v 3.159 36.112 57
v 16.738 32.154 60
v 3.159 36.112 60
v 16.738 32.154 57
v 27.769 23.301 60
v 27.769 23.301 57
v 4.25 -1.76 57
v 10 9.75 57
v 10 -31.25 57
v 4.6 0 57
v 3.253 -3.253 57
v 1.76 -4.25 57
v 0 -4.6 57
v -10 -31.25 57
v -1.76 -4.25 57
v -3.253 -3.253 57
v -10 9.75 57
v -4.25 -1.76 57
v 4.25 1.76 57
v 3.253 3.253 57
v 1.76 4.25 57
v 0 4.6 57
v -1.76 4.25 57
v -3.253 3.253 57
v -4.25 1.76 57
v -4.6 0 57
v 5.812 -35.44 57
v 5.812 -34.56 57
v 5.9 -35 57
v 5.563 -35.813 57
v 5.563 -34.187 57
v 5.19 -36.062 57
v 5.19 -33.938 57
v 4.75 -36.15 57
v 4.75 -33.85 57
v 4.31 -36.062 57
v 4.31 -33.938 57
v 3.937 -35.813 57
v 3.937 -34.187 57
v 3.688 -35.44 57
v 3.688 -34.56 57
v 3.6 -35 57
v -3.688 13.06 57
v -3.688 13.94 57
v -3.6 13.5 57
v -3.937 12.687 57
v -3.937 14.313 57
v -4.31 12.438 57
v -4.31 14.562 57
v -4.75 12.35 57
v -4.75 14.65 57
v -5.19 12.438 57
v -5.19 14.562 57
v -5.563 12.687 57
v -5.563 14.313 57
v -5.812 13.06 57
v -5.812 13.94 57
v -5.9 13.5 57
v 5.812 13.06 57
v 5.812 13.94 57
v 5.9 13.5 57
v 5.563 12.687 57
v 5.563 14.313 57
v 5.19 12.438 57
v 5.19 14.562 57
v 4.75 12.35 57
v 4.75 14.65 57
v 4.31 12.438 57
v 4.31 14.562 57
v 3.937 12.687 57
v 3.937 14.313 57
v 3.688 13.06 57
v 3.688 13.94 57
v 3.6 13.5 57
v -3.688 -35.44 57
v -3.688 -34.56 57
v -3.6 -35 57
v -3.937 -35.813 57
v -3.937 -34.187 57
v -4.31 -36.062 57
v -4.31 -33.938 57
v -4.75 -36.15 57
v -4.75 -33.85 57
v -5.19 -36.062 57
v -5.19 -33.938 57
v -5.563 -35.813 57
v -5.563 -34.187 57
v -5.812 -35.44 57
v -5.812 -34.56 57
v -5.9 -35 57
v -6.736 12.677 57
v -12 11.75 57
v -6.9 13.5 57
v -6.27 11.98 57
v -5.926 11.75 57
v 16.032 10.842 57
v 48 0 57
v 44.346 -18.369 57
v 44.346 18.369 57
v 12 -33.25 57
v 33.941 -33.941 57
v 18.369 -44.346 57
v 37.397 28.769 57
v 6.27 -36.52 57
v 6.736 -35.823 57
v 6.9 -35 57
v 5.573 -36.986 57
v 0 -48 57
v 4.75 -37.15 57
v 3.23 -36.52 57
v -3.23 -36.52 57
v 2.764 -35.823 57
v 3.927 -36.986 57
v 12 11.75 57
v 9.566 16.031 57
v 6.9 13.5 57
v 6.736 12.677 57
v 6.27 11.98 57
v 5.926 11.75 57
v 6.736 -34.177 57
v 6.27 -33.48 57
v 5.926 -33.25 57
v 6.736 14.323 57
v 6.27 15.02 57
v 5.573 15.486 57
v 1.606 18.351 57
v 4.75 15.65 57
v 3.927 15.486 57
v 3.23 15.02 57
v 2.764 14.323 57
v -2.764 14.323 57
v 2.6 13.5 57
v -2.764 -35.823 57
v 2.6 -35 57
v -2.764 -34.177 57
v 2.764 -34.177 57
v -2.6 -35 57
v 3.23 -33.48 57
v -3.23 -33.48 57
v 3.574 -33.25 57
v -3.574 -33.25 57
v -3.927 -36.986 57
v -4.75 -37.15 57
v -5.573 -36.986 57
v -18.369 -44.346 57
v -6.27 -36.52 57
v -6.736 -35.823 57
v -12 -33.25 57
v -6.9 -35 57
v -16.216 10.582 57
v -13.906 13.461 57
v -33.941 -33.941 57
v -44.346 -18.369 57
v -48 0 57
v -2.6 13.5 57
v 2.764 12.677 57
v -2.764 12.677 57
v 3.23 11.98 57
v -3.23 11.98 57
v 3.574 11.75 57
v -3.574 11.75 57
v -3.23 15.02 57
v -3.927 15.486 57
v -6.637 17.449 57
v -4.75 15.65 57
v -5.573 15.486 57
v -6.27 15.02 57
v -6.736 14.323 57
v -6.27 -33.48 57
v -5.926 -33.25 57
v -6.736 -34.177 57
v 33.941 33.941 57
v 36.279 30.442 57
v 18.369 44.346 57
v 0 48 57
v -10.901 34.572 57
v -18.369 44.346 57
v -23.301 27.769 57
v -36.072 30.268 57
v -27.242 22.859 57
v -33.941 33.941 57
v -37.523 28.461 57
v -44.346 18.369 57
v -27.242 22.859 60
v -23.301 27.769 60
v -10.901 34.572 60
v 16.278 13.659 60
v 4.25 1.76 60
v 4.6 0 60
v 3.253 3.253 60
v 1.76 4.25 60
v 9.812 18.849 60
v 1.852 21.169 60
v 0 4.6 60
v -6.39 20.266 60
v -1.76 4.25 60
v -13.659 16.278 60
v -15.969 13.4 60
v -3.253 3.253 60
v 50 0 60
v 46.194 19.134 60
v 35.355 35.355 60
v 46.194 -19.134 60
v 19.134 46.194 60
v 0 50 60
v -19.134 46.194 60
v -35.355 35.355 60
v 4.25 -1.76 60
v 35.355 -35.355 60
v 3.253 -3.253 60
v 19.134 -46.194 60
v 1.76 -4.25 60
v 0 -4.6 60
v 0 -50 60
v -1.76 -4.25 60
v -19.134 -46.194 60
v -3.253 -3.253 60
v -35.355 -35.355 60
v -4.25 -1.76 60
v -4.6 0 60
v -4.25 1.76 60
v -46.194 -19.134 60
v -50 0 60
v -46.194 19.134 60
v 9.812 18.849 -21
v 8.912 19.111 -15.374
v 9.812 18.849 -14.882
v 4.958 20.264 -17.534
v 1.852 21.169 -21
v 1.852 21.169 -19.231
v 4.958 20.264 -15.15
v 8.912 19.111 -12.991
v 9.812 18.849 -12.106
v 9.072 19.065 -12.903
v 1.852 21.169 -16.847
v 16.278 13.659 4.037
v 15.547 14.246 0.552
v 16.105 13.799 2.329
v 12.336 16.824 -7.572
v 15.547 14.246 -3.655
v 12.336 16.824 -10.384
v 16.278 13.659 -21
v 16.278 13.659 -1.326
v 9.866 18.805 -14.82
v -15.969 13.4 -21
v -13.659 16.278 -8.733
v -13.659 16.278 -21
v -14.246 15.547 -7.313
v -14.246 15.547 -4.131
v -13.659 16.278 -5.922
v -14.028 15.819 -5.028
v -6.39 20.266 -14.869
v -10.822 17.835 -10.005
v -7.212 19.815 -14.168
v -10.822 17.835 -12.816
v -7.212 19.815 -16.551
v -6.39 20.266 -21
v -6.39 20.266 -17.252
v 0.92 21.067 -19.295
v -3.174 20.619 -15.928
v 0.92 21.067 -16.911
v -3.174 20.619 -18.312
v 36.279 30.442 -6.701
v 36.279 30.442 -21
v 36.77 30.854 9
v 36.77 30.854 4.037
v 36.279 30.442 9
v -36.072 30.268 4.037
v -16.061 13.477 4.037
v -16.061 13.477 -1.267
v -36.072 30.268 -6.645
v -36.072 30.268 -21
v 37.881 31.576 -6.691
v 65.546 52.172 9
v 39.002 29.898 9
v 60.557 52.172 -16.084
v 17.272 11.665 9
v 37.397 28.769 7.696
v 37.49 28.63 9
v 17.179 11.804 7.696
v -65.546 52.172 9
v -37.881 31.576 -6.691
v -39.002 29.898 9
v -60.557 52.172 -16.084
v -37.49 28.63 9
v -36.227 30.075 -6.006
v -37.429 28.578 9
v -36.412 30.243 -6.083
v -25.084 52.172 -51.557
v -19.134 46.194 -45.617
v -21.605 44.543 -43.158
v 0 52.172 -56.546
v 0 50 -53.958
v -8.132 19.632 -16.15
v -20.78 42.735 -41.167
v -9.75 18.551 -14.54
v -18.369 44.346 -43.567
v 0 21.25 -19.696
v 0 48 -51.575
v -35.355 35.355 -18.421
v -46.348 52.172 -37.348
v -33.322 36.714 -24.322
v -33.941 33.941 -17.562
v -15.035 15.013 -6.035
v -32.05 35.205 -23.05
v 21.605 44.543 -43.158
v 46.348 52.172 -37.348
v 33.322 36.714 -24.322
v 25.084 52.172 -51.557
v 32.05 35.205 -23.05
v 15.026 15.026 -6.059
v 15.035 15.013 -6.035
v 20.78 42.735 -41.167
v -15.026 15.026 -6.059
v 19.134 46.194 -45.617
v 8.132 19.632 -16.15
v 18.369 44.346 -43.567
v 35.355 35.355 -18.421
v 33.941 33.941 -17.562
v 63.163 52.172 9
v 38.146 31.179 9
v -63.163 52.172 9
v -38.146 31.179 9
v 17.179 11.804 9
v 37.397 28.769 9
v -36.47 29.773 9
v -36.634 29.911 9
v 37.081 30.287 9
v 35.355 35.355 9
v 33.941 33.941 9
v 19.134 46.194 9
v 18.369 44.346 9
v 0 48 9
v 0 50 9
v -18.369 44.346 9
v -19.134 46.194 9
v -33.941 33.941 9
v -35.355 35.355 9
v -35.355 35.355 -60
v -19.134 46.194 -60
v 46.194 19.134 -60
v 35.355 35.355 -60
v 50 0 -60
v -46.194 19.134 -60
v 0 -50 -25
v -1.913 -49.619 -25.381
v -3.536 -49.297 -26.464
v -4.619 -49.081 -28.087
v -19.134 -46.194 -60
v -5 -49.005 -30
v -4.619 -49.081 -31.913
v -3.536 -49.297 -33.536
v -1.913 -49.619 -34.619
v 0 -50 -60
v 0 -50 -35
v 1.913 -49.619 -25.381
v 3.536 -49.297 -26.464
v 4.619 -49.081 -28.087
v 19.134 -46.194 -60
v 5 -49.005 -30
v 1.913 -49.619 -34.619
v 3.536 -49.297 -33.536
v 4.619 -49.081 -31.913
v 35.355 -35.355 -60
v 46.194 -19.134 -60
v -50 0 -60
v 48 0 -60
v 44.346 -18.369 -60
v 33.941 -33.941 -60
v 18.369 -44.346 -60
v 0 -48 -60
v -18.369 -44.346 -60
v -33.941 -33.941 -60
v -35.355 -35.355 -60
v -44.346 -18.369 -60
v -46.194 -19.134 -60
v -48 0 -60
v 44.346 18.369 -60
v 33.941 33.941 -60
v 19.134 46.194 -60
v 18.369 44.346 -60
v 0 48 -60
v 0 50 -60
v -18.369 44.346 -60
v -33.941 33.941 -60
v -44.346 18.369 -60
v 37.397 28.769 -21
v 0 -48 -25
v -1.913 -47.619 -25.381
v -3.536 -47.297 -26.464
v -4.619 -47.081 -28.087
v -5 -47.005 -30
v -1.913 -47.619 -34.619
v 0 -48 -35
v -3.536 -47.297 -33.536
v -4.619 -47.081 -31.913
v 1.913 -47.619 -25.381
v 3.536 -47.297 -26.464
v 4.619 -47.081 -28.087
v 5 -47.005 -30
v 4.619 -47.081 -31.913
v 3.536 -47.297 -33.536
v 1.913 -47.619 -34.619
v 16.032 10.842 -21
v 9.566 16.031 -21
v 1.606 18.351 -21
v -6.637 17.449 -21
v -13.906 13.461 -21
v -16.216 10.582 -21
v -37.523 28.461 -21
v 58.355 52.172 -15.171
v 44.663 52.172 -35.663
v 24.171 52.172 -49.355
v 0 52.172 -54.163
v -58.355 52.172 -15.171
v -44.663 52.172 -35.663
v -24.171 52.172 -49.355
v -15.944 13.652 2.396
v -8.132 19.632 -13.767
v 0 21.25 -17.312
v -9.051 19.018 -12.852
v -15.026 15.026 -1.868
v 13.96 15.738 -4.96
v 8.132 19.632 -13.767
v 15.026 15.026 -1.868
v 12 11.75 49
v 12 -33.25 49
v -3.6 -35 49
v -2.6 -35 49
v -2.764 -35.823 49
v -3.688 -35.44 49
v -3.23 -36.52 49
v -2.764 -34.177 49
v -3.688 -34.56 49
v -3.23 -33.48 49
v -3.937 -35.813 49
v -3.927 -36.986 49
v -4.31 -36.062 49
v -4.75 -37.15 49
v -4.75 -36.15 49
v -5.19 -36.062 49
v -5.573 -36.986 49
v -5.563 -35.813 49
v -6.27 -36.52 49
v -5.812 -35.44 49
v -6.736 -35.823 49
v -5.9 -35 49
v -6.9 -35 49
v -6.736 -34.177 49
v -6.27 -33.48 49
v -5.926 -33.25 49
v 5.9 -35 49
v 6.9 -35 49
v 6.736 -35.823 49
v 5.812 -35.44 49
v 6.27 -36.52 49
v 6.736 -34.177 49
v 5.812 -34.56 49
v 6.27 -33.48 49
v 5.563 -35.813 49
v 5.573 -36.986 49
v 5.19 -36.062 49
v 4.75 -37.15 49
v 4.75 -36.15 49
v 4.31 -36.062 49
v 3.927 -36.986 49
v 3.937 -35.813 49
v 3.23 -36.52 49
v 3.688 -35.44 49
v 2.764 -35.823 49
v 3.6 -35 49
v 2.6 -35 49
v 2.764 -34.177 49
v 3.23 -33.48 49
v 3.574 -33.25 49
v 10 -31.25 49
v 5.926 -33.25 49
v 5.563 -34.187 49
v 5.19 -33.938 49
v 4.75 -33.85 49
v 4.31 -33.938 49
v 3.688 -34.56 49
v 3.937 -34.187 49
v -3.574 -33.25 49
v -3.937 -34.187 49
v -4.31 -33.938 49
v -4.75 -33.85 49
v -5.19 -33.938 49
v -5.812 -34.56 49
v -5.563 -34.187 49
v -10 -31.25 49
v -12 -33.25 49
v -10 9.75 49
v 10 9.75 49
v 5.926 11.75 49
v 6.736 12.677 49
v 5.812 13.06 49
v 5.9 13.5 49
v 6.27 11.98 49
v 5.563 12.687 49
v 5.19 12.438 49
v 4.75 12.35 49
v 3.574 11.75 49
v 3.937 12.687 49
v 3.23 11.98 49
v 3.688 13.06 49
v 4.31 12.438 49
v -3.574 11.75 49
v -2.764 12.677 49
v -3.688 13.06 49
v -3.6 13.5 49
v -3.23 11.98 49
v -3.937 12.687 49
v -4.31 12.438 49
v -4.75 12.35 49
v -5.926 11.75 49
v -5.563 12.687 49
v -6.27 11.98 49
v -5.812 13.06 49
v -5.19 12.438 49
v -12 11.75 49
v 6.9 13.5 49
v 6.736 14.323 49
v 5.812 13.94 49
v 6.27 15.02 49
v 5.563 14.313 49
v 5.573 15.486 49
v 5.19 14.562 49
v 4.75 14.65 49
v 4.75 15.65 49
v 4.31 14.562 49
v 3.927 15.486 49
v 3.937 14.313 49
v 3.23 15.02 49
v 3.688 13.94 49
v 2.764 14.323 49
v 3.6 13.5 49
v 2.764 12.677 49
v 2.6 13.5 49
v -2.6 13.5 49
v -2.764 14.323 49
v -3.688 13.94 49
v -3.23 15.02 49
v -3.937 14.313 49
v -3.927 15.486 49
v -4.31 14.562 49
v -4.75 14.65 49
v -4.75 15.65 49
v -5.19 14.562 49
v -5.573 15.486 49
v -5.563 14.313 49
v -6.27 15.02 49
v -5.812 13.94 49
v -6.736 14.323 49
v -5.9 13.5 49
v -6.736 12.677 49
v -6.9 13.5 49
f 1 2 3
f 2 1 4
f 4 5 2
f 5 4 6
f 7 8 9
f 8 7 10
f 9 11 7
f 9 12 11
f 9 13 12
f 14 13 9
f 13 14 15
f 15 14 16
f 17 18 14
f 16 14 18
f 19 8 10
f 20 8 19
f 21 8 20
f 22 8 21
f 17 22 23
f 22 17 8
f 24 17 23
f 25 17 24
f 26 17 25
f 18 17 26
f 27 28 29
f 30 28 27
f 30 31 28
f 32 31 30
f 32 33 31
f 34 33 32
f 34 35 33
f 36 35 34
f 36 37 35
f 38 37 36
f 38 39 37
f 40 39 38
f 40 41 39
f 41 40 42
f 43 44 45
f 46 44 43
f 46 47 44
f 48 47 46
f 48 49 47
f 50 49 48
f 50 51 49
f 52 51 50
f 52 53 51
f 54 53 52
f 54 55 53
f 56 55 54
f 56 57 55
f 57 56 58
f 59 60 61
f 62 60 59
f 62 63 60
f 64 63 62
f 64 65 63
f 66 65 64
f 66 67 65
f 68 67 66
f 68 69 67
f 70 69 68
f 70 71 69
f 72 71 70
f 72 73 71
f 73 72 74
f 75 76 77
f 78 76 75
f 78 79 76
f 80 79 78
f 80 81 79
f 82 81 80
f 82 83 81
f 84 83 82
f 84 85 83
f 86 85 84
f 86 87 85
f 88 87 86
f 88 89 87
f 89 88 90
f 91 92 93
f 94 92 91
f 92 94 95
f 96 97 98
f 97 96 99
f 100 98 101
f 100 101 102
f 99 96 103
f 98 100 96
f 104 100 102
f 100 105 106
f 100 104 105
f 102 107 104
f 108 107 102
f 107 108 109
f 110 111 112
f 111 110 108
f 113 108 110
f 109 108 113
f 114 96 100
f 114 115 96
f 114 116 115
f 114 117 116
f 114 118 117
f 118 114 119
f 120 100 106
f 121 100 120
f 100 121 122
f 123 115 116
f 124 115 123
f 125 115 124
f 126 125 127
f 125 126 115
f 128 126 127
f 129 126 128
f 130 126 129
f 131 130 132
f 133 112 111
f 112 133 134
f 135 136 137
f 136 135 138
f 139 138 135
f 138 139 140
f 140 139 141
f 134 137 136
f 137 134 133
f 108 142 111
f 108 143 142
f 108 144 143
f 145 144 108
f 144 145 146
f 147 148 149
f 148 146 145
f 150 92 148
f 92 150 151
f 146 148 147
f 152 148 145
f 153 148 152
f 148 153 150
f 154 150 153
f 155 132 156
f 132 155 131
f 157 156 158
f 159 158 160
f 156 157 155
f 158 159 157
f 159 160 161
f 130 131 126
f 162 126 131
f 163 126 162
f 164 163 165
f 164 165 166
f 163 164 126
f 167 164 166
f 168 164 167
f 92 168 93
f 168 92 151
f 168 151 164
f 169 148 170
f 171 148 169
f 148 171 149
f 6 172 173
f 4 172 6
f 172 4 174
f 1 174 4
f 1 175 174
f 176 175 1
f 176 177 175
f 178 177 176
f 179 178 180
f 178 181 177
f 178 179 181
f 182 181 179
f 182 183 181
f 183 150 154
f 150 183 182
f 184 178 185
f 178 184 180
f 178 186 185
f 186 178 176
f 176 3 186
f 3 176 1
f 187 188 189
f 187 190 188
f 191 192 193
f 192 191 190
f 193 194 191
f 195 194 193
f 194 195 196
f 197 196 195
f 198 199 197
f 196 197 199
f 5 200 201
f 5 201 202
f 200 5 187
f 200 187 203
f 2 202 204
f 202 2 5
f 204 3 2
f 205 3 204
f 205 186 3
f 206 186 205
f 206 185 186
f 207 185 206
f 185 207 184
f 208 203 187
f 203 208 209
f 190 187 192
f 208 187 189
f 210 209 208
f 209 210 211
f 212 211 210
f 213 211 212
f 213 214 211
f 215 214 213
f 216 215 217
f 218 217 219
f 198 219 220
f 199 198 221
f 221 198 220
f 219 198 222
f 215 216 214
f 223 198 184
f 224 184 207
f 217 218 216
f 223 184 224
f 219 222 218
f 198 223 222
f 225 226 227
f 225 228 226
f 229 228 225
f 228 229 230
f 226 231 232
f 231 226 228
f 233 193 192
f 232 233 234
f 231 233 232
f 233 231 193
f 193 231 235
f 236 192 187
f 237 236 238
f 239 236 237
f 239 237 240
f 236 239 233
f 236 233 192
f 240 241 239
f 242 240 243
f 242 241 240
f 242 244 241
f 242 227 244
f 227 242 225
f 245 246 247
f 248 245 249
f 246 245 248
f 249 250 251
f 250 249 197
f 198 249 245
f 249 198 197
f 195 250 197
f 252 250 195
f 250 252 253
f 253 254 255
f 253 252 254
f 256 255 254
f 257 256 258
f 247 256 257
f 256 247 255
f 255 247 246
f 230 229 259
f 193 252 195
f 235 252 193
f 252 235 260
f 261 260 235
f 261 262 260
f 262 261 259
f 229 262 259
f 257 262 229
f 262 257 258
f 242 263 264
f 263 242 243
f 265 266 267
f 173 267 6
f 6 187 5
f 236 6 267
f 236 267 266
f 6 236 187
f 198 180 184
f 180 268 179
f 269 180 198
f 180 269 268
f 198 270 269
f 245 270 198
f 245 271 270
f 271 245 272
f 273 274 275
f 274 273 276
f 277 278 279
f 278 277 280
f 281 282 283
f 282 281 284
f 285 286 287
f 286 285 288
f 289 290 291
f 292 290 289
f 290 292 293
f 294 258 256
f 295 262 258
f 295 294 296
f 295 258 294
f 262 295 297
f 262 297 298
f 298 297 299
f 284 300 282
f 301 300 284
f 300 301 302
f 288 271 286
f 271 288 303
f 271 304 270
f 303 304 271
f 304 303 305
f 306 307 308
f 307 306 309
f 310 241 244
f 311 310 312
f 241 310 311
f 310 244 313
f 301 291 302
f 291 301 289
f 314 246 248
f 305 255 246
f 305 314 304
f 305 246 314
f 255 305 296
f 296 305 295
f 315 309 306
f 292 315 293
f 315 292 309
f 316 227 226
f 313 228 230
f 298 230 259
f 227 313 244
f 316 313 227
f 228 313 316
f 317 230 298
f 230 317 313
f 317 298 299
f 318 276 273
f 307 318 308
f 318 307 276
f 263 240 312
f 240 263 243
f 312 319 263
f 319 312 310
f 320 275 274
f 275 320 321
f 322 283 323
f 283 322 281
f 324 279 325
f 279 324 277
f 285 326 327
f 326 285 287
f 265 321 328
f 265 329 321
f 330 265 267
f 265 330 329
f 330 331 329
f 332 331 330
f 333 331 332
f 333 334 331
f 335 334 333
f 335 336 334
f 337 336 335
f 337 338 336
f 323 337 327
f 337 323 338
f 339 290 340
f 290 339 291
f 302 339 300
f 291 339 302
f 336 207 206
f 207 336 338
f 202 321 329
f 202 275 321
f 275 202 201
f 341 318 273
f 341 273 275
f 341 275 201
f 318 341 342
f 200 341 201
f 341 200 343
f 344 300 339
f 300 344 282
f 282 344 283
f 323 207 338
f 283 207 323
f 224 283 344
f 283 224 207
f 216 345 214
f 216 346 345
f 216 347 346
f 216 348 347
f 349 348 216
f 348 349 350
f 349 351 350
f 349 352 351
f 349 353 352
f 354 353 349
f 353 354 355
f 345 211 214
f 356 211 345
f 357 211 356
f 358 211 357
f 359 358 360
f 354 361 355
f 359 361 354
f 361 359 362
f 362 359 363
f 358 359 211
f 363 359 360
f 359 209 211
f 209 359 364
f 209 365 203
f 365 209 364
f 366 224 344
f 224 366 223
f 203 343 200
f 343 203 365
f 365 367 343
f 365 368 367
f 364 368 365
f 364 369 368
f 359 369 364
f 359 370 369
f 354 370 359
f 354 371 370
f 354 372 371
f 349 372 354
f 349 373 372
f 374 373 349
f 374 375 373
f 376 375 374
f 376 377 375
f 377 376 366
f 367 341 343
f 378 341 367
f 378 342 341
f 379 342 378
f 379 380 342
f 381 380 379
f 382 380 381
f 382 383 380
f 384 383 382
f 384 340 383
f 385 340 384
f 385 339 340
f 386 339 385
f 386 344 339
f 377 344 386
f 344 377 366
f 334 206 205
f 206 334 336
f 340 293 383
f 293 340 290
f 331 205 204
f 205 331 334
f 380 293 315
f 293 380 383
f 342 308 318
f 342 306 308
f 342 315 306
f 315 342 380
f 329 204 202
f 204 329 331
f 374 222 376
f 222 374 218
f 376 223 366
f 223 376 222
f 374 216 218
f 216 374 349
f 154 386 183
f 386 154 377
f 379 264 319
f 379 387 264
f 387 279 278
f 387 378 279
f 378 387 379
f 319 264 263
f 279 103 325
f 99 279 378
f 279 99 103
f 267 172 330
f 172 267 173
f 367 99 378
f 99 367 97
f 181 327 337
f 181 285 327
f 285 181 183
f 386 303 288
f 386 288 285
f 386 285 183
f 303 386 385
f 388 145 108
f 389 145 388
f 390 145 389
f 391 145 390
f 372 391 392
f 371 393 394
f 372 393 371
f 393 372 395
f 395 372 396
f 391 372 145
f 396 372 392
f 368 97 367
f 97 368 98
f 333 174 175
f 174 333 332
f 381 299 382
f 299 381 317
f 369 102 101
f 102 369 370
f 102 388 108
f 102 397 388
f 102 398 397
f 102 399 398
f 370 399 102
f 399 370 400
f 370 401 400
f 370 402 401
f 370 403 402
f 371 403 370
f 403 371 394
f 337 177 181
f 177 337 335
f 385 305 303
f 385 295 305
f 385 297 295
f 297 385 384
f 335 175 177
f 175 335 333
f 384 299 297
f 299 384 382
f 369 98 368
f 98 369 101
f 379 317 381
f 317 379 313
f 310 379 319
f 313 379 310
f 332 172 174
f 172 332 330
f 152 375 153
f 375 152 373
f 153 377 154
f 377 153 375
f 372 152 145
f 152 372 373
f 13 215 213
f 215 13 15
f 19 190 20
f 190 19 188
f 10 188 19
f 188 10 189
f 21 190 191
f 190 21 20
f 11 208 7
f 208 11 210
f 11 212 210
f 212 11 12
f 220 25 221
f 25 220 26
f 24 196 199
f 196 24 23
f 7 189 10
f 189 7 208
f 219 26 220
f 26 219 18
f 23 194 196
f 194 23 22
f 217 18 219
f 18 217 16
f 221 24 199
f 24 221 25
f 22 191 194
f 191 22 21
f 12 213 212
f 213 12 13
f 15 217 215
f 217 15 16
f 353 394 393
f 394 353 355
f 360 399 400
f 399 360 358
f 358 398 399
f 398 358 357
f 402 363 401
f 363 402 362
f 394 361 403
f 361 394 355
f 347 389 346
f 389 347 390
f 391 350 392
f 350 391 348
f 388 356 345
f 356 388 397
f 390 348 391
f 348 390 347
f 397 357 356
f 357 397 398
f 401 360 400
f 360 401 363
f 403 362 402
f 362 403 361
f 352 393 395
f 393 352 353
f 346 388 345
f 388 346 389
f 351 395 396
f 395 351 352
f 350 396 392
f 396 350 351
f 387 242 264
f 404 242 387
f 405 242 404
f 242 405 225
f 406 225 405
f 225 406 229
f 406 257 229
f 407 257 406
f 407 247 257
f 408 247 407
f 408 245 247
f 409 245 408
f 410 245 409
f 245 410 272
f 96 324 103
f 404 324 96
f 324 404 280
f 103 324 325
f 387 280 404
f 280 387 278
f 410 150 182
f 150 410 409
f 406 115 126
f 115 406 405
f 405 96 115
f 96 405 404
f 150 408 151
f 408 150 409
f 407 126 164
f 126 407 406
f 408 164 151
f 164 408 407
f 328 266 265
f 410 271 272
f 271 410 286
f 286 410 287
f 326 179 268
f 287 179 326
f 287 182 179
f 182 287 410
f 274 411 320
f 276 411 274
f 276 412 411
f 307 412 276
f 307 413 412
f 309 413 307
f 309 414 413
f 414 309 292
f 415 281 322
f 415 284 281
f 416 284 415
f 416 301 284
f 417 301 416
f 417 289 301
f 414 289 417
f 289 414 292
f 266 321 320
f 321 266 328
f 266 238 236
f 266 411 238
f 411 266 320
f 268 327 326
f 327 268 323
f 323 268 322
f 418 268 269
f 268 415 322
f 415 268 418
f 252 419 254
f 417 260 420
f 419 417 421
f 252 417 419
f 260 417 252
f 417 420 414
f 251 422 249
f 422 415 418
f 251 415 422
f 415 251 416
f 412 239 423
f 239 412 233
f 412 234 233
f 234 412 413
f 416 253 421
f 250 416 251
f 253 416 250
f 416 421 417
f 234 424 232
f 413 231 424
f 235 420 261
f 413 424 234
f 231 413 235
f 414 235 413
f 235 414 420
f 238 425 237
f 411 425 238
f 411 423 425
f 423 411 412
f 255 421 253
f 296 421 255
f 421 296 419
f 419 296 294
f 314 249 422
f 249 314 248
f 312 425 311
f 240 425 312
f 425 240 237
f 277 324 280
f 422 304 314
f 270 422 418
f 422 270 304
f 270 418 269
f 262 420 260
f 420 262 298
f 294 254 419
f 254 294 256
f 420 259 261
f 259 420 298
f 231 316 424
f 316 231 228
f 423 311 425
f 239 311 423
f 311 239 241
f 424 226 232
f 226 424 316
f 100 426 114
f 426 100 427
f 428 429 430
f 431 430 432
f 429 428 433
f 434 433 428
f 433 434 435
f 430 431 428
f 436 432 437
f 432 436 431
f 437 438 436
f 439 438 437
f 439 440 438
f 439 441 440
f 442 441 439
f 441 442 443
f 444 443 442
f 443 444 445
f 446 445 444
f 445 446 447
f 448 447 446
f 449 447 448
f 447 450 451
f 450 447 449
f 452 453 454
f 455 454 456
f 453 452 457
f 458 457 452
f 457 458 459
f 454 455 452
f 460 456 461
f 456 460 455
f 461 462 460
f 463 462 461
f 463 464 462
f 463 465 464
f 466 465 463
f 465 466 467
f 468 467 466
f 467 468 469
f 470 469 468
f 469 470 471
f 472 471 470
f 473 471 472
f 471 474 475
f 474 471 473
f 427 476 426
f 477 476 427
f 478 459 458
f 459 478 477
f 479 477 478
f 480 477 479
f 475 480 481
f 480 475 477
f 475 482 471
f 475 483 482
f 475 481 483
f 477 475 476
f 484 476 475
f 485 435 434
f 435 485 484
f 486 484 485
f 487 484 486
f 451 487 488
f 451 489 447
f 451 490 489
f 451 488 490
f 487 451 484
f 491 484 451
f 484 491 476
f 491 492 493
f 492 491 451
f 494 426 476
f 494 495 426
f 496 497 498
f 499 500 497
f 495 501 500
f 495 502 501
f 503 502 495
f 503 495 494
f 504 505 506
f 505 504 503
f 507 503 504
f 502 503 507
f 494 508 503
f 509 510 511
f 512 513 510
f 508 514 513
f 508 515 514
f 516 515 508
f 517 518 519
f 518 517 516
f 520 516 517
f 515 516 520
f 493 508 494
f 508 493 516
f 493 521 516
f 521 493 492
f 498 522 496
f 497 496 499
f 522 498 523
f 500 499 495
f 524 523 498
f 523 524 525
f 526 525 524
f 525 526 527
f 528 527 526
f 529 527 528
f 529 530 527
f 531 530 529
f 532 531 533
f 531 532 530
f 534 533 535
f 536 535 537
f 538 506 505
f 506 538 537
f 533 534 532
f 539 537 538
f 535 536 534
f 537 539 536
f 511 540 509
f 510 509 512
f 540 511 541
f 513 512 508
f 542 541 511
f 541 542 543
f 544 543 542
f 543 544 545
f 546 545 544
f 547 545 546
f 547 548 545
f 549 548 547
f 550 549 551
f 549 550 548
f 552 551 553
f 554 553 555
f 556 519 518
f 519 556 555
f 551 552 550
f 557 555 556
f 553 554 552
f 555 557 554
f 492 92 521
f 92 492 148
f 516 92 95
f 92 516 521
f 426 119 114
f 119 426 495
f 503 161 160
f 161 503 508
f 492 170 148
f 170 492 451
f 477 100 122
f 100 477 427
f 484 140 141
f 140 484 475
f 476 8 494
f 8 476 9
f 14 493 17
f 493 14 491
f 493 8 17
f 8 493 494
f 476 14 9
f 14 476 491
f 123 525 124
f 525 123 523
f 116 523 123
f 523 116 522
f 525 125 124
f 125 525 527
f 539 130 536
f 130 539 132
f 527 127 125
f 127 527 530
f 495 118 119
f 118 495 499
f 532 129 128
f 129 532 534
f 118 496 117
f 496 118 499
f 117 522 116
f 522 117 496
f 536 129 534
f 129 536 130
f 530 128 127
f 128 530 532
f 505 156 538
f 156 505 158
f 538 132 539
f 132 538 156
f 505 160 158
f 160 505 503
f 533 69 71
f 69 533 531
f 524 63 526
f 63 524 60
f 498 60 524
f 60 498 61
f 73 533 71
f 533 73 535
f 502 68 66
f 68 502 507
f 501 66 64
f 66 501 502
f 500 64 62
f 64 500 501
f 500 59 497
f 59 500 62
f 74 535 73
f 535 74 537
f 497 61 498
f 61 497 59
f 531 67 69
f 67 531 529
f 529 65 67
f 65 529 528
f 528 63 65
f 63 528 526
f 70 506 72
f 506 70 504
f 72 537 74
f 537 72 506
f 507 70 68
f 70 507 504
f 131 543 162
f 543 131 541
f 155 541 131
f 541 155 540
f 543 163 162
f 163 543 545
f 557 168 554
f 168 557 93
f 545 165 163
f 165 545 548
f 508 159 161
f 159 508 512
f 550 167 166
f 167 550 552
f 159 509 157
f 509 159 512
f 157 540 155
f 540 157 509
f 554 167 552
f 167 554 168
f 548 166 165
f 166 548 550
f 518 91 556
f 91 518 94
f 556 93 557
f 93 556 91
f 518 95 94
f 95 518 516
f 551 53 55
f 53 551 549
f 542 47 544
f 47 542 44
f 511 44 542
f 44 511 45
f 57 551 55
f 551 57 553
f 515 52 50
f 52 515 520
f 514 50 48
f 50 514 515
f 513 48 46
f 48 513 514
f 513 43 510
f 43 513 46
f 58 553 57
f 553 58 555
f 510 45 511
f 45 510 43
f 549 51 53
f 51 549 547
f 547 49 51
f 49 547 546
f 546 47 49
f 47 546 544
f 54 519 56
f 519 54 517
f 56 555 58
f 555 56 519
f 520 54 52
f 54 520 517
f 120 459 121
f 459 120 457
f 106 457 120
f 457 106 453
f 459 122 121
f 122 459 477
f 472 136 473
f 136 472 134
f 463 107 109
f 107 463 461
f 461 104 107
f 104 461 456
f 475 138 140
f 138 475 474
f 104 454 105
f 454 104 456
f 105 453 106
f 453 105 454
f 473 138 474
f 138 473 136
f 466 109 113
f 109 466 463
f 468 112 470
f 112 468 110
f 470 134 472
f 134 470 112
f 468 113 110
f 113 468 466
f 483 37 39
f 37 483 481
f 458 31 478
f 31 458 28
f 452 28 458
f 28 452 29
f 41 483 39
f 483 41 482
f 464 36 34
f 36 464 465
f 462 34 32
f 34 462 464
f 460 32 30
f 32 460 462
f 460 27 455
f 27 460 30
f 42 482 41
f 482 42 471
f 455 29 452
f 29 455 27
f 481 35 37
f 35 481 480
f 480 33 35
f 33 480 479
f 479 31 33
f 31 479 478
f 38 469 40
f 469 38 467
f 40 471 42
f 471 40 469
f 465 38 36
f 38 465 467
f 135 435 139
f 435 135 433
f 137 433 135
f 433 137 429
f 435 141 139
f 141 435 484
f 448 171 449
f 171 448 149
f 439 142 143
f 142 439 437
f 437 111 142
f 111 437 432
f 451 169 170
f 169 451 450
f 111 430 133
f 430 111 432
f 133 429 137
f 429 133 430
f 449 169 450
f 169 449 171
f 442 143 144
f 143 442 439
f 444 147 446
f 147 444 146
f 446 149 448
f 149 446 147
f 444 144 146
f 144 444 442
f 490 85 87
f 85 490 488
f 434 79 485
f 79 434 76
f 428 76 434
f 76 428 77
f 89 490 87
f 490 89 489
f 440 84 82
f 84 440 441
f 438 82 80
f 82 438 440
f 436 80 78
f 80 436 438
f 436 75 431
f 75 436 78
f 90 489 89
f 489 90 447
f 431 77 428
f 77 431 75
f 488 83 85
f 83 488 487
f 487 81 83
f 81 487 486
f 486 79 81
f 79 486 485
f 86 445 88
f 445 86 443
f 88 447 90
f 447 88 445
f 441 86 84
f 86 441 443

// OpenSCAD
difference(){
  cylinder($fn=16, d = 100, h = 120, center = true);
  translate([0, 0, -1.5])cylinder($fn=16, d = 96, h = 117, center = true);
  
  // Servo Loch
  translate([0, 0, 58.5])cylinder($fn=16, d=9.2, h=3, center = true);
  
  // Ausschnitt Futterdurchlass
  translate([0, 0, 58.5])rotate([0, 0, 40])intersection(){
    difference(){
      cylinder($fn=16, d=72.5, h=3,center = true);
      cylinder($fn=16, d=42.5, h=3,center = true);
    }
  
    polyhedron(
      points=[ [0, 0,  2,], [75, 0,  2], [75*cos(100), 75*sin(100),  2],
               [0, 0, -2,], [75, 0, -2], [75*cos(100), 75*sin(100), -2] ],
      faces=
              [[0,1,2], // Unterer Deckel
              [0,4,1], // Abdeckung x-Seite
              [0,3,4], // Abdeckung x-Seite
              [0,5,3], // Abdeckung schiefe Seite
              [0,2,5], // Abdeckung schiefe Seite
              [1,5,2], // Abdeckung Hypothenuse
              [1,4,5], // Abdeckung Hypothenuse
              [3,5,4]  // Oberer Deckel
              ]
    );
  }
  //Ausschnitt Futterdurchlass Seite
  translate([0, -2*sqrt(2), 9])rotate([-90, 0, 0])difference(){
    cylinder($fn=16, d1=0, d2=2*55*tan(100/2), h=2*55/2);
    translate([0, -50, 50])cube([200,100,100], center = true);
  }
  //Ausschnitt Kabelloch
  translate([0, -50, -30])rotate([90, 0, 0])cylinder(d=10, h=20, center = true);
}  
//Kanal Futter
translate([0, 0, 118/2 - 25])rotate([0, 0, 40])difference(){
  translate([-2, -2, 0])difference(){
      polyhedron(
        points=[ [0, 0,  25,], [75, 0,  25], [75*cos(100), 75*sin(100),  25],
                 [0, 0, -55,], [75, 0, -55], [75*cos(100), 75*sin(100), -55] ],
        faces=
                [[0,1,2], // Unterer Deckel
                [0,4,1], // Abdeckung x-Seite
                [0,3,4], // Abdeckung x-Seite
                [0,5,3], // Abdeckung schiefe Seite
                [0,2,5], // Abdeckung schiefe Seite
                [1,5,2], // Abdeckung Hypothenuse
                [1,4,5], // Abdeckung Hypothenuse
                [3,5,4]  // Oberer Deckel
                ]
      );
    cylinder($fn=16, d=42.5, h=110,center = true);
  }
  
  difference(){
      polyhedron(
        points=[ [0, 0,  25,], [75, 0,  25], [75*cos(100), 75*sin(100),  25],
                 [0, 0, -55,], [75, 0, -55], [75*cos(100), 75*sin(100), -55] ],
        faces=
                [[0,1,2], // Unterer Deckel
                [0,4,1], // Abdeckung x-Seite
                [0,3,4], // Abdeckung x-Seite
                [0,5,3], // Abdeckung schiefe Seite
                [0,2,5], // Abdeckung schiefe Seite
                [1,5,2], // Abdeckung Hypothenuse
                [1,4,5], // Abdeckung Hypothenuse
                [3,5,4]  // Oberer Deckel
                ]
      );
    cylinder($fn=16, d=42.5, h=110,center = true);
  }
  difference(){ // Alles über der Außenwand abschneiden
    cylinder($fn=16, d = 200, h = 120, center = true);
    cylinder($fn=16, d = 96, h = 120, center = true);
  }
}

//Futterkanal unten:
difference(){
  translate([0, -2*sqrt(2), 9])rotate([-90, 0, 0])difference(){
    cylinder($fn=16, d1=0, d2=2*55*tan(100/2), h=2*55/2);
    translate([0, 0, 2])cylinder($fn=16, d1=0, d2=2*55*tan(100/2), h=2*55/2);
    translate([0, -50, 50])cube([200,100,100], center = true);
  }
  cylinder($fn=16, d=42.5, h=110,center = true);
}

//Rahmen Servo
translate([0, -10.75, 117/2 - 1.5 - 4])difference(){
  cube([24, 45, 8], center = true);
  cube([20, 41, 8], center = true);
}

//Schraubenlöcher
translate([9.5/2, 48.5/2 - 10.75, 117/2 - 1.5 - 4]){
  difference(){
  cylinder($fn=16, d=4.3, h=8, center = true);  
  cylinder($fn=16, d=2.3, h=8, center = true);
  }
}
translate([-9.5/2, 48.5/2 - 10.75, 117/2 - 1.5 - 4]){
  difference(){
  cylinder($fn=16, d=4.3, h=8, center = true);  
  cylinder($fn=16, d=2.3, h=8, center = true);
  }
}
translate([9.5/2, -48.5/2 - 10.75, 117/2 - 1.5 - 4]){
  difference(){
  cylinder($fn=16, d=4.3, h=8, center = true);  
  cylinder($fn=16, d=2.3, h=8, center = true);
  }
}
translate([-9.5/2, -48.5/2 - 10.75, 117/2 - 1.5 - 4]){
  difference(){
  cylinder($fn=16, d=4.3, h=8, center = true);  
  cylinder($fn=16, d=2.3, h=8, center = true);
  }
}
